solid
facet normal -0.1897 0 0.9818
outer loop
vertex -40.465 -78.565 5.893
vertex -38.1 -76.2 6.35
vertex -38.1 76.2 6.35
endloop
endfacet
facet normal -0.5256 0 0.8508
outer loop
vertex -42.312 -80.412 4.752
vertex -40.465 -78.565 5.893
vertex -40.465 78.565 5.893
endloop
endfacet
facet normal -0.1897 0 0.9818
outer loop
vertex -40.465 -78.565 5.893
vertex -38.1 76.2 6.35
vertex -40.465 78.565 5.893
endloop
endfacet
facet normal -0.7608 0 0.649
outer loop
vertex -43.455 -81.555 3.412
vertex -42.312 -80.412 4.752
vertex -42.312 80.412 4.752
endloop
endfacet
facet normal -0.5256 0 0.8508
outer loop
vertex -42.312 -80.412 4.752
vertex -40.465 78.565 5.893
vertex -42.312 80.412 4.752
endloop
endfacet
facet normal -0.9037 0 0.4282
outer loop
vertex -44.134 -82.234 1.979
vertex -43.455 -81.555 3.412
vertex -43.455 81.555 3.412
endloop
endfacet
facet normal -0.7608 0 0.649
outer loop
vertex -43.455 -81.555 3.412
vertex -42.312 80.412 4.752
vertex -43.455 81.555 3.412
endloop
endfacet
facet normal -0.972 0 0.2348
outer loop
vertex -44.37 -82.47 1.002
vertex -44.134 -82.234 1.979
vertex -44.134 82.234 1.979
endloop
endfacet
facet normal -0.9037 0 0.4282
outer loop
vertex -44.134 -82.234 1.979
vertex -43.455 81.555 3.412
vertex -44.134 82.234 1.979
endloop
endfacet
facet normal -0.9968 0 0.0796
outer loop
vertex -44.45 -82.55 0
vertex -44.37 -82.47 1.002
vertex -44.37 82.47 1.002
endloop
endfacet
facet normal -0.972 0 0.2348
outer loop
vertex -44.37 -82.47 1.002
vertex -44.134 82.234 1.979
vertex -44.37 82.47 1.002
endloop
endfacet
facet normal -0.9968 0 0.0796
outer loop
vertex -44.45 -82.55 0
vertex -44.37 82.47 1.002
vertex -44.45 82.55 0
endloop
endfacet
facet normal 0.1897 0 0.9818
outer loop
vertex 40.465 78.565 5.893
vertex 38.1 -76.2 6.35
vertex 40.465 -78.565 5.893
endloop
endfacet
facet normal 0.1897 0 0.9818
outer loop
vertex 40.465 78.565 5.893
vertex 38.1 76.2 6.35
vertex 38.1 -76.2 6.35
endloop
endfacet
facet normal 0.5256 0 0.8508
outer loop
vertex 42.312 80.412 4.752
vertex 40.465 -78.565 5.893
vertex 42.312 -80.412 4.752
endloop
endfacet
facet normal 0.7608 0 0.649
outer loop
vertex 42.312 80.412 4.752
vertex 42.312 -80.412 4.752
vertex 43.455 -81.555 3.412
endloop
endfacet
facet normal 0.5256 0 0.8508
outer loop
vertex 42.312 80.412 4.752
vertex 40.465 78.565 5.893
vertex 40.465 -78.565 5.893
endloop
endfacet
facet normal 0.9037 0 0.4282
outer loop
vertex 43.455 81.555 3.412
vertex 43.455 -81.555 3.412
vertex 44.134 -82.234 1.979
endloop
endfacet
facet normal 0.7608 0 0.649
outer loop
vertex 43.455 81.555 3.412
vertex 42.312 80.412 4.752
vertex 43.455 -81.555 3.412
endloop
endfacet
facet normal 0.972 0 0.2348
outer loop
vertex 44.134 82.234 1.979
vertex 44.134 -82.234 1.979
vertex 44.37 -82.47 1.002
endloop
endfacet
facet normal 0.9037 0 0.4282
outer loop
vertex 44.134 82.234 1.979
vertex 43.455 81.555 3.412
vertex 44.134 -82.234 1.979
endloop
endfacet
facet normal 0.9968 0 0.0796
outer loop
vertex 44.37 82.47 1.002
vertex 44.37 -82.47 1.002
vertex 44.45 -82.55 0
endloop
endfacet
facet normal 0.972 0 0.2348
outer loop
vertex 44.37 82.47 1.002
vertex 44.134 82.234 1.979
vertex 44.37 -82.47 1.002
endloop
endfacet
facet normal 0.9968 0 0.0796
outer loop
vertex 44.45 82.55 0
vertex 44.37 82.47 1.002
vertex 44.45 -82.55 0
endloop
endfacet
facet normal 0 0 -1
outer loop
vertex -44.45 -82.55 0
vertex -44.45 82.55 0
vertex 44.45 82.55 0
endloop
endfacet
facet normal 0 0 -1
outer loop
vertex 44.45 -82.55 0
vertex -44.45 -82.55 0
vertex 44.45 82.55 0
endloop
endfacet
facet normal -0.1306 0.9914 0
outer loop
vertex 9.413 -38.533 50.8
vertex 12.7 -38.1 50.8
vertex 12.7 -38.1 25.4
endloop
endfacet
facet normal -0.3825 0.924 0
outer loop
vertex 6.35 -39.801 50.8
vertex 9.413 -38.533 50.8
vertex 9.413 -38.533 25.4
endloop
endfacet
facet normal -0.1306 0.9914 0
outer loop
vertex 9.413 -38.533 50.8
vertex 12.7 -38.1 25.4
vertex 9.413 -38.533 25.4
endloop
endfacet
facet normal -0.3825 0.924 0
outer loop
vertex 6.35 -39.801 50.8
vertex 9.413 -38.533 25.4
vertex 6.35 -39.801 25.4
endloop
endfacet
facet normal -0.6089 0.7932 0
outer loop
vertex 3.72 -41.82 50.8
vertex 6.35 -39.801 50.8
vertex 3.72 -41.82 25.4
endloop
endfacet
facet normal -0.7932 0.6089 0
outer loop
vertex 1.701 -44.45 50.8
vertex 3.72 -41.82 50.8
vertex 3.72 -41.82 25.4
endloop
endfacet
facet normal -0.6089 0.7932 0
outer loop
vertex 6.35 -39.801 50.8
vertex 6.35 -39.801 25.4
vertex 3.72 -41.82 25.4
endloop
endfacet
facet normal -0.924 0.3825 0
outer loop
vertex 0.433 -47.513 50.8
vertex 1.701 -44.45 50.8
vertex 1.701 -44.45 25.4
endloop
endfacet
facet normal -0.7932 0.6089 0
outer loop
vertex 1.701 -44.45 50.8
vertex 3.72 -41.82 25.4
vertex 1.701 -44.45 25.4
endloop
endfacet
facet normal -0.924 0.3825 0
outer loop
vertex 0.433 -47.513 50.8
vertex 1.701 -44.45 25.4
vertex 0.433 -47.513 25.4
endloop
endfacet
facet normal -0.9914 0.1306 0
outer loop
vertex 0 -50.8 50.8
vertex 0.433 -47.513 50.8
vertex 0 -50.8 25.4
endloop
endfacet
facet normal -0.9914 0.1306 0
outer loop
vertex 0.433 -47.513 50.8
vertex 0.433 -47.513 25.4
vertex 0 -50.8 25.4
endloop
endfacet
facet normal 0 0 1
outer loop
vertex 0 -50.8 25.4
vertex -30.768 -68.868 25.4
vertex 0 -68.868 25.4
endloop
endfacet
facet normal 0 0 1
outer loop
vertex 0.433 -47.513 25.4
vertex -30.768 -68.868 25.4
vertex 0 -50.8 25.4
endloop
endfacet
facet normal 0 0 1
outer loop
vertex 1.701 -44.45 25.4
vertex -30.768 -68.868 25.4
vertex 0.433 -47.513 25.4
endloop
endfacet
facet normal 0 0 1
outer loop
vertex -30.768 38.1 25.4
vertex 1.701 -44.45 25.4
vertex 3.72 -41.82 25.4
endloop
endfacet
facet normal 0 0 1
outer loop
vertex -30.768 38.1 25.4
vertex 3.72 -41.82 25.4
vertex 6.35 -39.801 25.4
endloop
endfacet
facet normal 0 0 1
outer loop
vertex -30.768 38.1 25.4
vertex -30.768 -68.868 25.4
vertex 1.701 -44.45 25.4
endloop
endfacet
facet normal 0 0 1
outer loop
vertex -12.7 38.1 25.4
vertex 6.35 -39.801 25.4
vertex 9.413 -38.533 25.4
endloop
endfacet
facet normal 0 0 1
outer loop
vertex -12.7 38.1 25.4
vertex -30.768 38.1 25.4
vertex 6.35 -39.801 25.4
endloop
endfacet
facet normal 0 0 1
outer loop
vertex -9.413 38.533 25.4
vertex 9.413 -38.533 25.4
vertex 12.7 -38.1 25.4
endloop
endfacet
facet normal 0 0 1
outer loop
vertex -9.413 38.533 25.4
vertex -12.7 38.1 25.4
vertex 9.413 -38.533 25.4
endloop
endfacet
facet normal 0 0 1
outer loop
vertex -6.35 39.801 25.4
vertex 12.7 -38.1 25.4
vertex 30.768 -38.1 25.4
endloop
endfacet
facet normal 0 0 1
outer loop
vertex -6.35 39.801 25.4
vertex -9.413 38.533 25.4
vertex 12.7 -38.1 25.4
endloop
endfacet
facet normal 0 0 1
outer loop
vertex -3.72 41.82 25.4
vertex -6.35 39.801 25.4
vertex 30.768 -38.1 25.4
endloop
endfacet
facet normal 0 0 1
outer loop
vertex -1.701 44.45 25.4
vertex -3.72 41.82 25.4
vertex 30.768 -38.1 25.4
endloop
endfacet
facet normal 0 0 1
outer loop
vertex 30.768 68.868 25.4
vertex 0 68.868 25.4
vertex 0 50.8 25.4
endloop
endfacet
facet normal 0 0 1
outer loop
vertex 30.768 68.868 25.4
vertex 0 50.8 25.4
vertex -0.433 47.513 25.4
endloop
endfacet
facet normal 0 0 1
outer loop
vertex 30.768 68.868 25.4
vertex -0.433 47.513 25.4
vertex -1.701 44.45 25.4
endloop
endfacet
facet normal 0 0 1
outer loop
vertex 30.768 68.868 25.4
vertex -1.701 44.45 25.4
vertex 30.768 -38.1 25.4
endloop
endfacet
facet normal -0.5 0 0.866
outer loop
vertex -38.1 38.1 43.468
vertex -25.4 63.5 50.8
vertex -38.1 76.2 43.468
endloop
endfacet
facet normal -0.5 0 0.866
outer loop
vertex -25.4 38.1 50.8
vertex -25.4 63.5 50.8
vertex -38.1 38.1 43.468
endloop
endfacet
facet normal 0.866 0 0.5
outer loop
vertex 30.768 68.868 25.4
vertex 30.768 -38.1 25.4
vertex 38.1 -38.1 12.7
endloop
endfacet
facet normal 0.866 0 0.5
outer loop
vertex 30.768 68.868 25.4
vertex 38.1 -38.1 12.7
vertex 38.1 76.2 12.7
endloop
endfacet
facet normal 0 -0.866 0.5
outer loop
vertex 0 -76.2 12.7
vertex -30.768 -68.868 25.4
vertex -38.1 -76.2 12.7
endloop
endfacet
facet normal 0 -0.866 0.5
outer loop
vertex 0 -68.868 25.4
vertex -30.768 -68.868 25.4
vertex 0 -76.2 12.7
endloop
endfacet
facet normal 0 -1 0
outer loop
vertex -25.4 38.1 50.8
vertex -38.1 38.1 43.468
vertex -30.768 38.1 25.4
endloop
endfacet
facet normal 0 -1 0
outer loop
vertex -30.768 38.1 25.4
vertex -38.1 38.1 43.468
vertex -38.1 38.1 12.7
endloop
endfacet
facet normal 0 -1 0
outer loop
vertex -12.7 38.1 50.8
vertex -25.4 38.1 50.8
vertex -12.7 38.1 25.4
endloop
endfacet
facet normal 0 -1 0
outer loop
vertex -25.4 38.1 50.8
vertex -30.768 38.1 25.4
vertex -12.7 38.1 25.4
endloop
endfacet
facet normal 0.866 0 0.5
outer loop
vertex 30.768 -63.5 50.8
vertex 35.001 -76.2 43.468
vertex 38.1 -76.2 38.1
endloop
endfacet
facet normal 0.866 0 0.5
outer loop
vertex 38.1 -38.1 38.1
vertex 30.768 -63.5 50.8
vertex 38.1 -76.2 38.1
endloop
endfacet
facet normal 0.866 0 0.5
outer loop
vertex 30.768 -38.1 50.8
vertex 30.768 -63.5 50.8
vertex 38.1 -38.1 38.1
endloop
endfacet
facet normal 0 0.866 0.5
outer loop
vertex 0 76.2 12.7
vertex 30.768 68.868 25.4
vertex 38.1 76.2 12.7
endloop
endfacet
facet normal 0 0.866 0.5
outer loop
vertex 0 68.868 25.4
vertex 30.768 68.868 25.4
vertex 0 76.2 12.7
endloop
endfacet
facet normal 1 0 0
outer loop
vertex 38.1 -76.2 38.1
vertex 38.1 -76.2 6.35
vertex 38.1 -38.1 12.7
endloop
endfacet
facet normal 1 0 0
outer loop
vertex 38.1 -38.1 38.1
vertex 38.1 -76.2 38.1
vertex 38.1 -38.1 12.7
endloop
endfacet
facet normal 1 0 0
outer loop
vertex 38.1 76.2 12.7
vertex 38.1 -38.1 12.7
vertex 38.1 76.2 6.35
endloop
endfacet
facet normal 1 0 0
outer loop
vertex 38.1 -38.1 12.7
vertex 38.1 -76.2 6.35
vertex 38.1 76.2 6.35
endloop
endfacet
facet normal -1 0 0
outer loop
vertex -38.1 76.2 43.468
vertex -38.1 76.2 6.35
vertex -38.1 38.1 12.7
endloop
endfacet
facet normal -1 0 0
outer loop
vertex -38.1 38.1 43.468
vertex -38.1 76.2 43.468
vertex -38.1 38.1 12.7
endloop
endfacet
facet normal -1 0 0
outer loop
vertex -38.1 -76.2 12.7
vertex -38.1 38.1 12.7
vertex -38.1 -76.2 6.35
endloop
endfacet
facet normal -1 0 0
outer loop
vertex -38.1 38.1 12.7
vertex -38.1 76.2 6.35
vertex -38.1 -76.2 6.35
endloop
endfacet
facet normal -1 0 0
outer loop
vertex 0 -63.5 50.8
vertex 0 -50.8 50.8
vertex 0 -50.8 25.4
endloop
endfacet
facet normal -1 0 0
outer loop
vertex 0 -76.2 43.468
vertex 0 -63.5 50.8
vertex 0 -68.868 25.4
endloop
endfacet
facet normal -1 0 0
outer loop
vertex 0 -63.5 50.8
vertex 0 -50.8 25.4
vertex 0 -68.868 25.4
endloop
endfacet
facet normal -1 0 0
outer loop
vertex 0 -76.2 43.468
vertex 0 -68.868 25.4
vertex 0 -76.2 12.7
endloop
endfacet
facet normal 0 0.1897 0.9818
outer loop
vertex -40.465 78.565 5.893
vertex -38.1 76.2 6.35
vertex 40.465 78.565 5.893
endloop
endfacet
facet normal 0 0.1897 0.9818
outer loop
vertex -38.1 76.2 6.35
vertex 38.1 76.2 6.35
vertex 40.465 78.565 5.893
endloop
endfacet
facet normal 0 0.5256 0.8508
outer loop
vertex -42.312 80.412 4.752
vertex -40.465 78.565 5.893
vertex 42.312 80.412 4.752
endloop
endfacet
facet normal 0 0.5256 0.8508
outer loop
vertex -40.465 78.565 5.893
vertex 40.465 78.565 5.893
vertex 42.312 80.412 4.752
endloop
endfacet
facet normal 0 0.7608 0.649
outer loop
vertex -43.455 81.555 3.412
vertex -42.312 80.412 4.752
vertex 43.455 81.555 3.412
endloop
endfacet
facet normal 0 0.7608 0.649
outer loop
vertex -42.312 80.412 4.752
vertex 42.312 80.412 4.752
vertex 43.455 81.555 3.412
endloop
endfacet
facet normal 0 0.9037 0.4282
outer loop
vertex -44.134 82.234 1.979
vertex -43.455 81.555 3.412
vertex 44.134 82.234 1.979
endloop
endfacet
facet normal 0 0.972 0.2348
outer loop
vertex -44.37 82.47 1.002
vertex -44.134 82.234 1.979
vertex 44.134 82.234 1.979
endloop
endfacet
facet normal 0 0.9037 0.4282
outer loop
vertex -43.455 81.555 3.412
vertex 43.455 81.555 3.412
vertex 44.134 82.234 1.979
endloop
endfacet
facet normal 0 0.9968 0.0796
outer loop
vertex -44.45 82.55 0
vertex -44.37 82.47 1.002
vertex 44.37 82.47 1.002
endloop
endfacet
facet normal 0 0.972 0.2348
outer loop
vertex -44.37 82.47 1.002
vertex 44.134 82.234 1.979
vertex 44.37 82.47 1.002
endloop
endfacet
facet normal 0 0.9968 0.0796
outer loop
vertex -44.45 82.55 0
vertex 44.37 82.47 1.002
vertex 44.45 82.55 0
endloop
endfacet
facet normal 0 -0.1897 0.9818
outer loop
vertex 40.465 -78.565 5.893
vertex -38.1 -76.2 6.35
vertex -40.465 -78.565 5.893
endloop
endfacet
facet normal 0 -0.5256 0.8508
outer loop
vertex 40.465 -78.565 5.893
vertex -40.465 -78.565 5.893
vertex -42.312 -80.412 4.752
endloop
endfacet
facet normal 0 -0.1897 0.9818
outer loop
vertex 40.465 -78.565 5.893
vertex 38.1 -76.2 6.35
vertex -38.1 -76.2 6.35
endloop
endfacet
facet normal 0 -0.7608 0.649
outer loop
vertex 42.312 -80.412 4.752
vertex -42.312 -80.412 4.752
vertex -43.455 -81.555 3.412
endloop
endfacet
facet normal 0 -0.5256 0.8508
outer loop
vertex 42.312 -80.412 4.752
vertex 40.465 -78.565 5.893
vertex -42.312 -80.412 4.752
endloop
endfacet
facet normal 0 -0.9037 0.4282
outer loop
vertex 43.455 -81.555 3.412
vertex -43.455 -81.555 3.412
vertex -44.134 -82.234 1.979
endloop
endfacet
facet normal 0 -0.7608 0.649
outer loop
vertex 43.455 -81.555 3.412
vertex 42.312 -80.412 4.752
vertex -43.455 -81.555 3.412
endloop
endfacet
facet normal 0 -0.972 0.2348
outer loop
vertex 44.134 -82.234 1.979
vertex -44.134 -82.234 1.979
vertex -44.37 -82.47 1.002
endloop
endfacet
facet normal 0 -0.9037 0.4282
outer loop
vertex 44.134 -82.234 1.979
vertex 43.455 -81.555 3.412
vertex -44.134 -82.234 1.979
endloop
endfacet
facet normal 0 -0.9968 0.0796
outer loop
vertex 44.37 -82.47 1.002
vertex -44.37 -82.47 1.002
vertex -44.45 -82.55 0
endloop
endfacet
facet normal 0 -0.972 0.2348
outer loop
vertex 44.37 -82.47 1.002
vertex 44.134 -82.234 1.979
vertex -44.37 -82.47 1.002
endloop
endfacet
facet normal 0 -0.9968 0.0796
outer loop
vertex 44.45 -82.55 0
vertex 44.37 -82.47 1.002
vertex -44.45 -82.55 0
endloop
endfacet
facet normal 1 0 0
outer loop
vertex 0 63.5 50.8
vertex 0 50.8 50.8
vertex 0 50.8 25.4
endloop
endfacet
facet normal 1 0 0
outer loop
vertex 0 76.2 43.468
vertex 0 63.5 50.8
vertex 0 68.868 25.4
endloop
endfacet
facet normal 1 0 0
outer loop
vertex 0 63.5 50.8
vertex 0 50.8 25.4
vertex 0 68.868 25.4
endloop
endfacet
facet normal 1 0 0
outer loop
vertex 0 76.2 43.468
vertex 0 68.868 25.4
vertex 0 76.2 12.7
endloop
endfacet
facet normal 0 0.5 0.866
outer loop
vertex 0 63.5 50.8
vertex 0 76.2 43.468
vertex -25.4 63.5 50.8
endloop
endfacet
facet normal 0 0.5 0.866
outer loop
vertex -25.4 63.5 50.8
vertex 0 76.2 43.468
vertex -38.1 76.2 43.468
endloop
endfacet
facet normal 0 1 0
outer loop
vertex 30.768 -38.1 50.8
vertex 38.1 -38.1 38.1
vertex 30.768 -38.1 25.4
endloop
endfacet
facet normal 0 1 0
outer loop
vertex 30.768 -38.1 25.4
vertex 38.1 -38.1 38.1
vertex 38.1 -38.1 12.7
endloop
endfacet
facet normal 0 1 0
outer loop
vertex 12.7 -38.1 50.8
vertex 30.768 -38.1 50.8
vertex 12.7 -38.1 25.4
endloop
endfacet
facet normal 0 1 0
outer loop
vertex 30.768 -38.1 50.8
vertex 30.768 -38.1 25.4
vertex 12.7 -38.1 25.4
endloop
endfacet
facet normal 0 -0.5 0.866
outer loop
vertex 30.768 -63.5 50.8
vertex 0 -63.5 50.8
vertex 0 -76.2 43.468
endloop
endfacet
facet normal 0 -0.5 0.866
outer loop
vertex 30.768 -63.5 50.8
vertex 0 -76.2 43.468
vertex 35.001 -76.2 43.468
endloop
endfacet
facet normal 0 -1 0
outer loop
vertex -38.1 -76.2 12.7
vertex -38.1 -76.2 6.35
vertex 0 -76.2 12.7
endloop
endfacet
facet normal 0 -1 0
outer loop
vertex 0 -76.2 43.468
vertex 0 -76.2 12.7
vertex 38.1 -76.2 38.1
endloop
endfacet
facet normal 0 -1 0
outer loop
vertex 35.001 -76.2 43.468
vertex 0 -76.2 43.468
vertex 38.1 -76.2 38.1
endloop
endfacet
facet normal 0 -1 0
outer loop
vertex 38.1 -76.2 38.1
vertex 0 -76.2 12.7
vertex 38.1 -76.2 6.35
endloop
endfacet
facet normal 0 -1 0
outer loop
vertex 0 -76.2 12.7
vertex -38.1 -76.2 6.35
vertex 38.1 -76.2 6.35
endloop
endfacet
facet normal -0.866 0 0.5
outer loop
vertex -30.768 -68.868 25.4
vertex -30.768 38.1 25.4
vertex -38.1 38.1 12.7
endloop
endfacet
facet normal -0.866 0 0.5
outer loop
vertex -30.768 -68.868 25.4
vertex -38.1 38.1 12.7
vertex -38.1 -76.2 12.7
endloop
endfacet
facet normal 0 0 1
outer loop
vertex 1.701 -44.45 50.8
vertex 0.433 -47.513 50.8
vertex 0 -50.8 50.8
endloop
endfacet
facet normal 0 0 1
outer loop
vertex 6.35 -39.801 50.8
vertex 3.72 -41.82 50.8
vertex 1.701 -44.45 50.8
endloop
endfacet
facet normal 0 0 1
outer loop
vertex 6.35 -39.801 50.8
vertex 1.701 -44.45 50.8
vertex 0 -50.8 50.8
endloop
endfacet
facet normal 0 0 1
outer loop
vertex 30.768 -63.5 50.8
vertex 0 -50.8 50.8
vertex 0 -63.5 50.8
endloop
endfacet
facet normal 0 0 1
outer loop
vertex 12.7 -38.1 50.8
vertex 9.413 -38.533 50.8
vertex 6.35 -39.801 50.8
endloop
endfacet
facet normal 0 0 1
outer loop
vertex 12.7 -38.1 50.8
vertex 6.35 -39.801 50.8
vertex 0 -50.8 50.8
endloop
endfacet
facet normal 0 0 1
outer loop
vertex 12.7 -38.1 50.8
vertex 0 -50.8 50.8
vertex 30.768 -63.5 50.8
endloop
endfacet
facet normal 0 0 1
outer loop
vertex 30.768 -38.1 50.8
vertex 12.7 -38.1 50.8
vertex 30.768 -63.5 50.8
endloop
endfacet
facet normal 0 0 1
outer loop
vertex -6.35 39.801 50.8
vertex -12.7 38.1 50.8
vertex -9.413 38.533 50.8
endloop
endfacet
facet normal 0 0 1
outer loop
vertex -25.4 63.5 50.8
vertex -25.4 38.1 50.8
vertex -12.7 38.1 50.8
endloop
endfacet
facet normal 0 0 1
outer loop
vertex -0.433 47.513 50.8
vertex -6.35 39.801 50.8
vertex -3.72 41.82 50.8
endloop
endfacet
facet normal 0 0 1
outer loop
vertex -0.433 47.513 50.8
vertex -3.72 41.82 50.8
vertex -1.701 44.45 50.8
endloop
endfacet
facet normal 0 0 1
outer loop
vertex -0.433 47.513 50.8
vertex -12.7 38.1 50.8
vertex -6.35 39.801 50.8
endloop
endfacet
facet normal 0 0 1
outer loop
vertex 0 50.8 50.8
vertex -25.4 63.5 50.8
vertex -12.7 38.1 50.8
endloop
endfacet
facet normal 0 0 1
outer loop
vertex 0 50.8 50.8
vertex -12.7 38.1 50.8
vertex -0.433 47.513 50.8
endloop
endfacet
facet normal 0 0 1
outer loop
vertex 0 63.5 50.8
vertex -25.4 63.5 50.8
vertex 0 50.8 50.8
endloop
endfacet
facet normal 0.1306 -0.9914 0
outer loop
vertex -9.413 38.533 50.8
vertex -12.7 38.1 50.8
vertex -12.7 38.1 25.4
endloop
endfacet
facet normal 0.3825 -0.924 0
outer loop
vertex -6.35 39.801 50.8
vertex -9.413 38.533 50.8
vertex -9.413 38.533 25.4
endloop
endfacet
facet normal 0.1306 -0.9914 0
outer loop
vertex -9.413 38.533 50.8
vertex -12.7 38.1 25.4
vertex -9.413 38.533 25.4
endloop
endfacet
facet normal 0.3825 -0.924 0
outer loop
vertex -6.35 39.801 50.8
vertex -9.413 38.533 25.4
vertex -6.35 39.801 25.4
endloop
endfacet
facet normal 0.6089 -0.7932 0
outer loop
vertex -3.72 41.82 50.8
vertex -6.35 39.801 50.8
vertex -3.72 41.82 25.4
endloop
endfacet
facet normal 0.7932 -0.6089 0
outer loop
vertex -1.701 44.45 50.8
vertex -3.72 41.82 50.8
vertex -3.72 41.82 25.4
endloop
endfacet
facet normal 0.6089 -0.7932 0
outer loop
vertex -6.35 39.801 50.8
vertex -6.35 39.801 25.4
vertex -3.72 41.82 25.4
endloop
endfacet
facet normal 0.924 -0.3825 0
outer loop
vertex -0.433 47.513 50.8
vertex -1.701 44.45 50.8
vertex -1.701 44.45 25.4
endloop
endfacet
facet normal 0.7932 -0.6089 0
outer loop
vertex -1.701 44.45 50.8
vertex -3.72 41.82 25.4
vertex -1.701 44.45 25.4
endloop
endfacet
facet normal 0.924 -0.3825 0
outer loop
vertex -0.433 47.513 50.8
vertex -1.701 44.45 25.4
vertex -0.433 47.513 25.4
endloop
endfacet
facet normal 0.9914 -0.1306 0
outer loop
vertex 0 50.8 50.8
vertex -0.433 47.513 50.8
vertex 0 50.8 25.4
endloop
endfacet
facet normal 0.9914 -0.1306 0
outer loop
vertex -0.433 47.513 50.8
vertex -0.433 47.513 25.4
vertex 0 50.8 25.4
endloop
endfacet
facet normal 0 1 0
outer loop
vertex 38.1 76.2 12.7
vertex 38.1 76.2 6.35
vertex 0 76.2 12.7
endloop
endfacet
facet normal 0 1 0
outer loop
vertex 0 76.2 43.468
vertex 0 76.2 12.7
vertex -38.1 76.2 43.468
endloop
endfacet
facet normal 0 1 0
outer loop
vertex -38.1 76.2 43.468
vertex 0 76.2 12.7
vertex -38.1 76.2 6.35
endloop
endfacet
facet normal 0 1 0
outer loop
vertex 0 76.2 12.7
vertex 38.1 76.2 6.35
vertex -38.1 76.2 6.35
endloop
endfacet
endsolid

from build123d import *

# Parameters (mm, degrees)
F0_W        = 88.9
F0_H        = 165.1
F1_DEPTH    = 6.35
F2_DEPTH    = 25.4
F3_DEPTH    = 50.8
F4_R        = 6.34999
F5_C1_SIZE2 = 12.7
F5_C1_SIZE  = 7.3323484187
F5_C2_SIZE2 = 7.3323484187
F5_C2_SIZE  = 12.7
F5_C3_SIZE2 = 7.3323484187
F5_C3_SIZE  = 12.7
F5_C4_SIZE2 = 7.3323484187
F5_C4_SIZE  = 12.7
F5_C5_SIZE2 = 7.3323484187
F5_C5_SIZE  = 12.7
F5_C6_SIZE2 = 7.3323484187
F5_C6_SIZE  = 12.7
F5_C7_SIZE2 = 12.7
F5_C7_SIZE  = 7.3323484187
F6_SIZE2    = 7.3323484187
F6_SIZE     = 12.7


# Not quite as in the source:
# - a fillet or chamfer is up to 0.001 mm smaller than in the source, because OpenCascade refuses the exact size


with BuildPart() as f1:
    # F0 (on Top) → F1 (new body)
    with BuildSketch(Plane.XY):
        Rectangle(F0_W, F0_H)
        Polygon((-38.1, 38.1), (-38.1, 76.2), (0, 76.2), (38.1, 76.2), (38.1, -38.1), (38.1, -76.2), (0, -76.2), (-38.1, -76.2), align=None, mode=Mode.SUBTRACT)
    extrude(amount=F1_DEPTH)

    # F0 (on Top) → F2 (join)
    with BuildSketch(Plane.XY):
        with BuildLine():
            Line((38.1, 76.2), (0, 76.2))
            Line((0, 76.2), (0, 50.8))
            ThreePointArc((0, 50.8), (-3.7197438789, 41.8197438789), (-12.7, 38.1))
            Line((-12.7, 38.1), (-38.1, 38.1))
            Line((-38.1, 38.1), (-38.1, -76.2))
            Line((-38.1, -76.2), (0, -76.2))
            Line((0, -76.2), (0, -50.8))
            ThreePointArc((0, -50.8), (3.7197438789, -41.8197438789), (12.7, -38.1))
            Line((12.7, -38.1), (38.1, -38.1))
            Line((38.1, -38.1), (38.1, 76.2))
        make_face()
    extrude(amount=F2_DEPTH)

    # F0 (on Top) → F3 (join)
    with BuildSketch(Plane.XY):
        with BuildLine():
            Line((38.1, -76.2), (38.1, -38.1))
            Line((38.1, -38.1), (12.7, -38.1))
            ThreePointArc((12.7, -38.1), (3.7197438789, -41.8197438789), (0, -50.8))
            Line((0, -50.8), (0, -76.2))
            Line((0, -76.2), (38.1, -76.2))
        make_face()
        with BuildLine():
            Line((0, 76.2), (-38.1, 76.2))
            Line((-38.1, 76.2), (-38.1, 38.1))
            Line((-38.1, 38.1), (-12.7, 38.1))
            ThreePointArc((-12.7, 38.1), (-3.7197438789, 41.8197438789), (0, 50.8))
            Line((0, 50.8), (0, 76.2))
        make_face()
    extrude(amount=F3_DEPTH)

    # F4 (radius 6.35 in the source; OpenCascade refuses exactly that, so slightly less here)
    f4_edges = [f1.edges().sort_by_distance(p)[0] for p in [
        (0, -82.55, 6.35),
        (44.45, 0, 6.35),
        (0, 82.55, 6.35),
        (-44.45, 0, 6.35),
    ]]
    fillet(f4_edges, radius=F4_R)

    # F5: chamfer of 12.7 x 7.3323484187 on 7 edges, made by hand

    # F5_c1
    f5_c1_edges = [f1.edges().sort_by_distance(p)[0] for p in [
        (-38.1, 57.15, 50.8),
    ]]
    f5_c1_side = f1.faces().sort_by_distance((-38.1, 57.15, 50.6533530316))[0]
    chamfer(f5_c1_edges, length=F5_C1_SIZE, length2=F5_C1_SIZE2, reference=f5_c1_side)

    # F5_c2
    f5_c2_edges = [f1.edges().sort_by_distance(p)[0] for p in [
        (-38.1, -19.05, 25.4),
    ]]
    f5_c2_side = f1.faces().sort_by_distance((-38.1, -19.05, 25.2533530316))[0]
    chamfer(f5_c2_edges, length=F5_C2_SIZE, length2=F5_C2_SIZE2, reference=f5_c2_side)

    # F5_c3
    f5_c3_edges = [f1.edges().sort_by_distance(p)[0] for p in [
        (19.05, 76.2, 25.4),
    ]]
    f5_c3_side = f1.faces().sort_by_distance((19.05, 76.2, 25.2533530316))[0]
    chamfer(f5_c3_edges, length=F5_C3_SIZE, length2=F5_C3_SIZE2, reference=f5_c3_side)

    # F5_c4
    f5_c4_edges = [f1.edges().sort_by_distance(p)[0] for p in [
        (38.1, -57.15, 50.8),
    ]]
    f5_c4_side = f1.faces().sort_by_distance((38.1, -57.15, 50.6533530316))[0]
    chamfer(f5_c4_edges, length=F5_C4_SIZE, length2=F5_C4_SIZE2, reference=f5_c4_side)

    # F5_c5
    f5_c5_edges = [f1.edges().sort_by_distance(p)[0] for p in [
        (38.1, 15.3838257906, 25.4),
    ]]
    f5_c5_side = f1.faces().sort_by_distance((38.1, 15.3838257906, 25.2533530316))[0]
    chamfer(f5_c5_edges, length=F5_C5_SIZE, length2=F5_C5_SIZE2, reference=f5_c5_side)

    # F5_c6
    f5_c6_edges = [f1.edges().sort_by_distance(p)[0] for p in [
        (-15.3838257906, -76.2, 25.4),
    ]]
    f5_c6_side = f1.faces().sort_by_distance((-15.3838257906, -76.2, 25.2533530316))[0]
    chamfer(f5_c6_edges, length=F5_C6_SIZE, length2=F5_C6_SIZE2, reference=f5_c6_side)

    # F5_c7
    f5_c7_edges = [f1.edges().sort_by_distance(p)[0] for p in [
        (15.3838257906, -76.2, 50.8),
    ]]
    f5_c7_side = f1.faces().sort_by_distance((15.3838257906, -76.2, 50.6533530316))[0]
    chamfer(f5_c7_edges, length=F5_C7_SIZE, length2=F5_C7_SIZE2, reference=f5_c7_side)

    # F6
    f6_edges = [f1.edges().sort_by_distance(p)[0] for p in [
        (-12.7, 76.2, 50.8),
    ]]
    f6_side = f1.faces().sort_by_distance((-13.065864, 57.751409, 50.8))[0]
    chamfer(f6_edges, length=F6_SIZE, length2=F6_SIZE2, reference=f6_side)


solid = f1.part
